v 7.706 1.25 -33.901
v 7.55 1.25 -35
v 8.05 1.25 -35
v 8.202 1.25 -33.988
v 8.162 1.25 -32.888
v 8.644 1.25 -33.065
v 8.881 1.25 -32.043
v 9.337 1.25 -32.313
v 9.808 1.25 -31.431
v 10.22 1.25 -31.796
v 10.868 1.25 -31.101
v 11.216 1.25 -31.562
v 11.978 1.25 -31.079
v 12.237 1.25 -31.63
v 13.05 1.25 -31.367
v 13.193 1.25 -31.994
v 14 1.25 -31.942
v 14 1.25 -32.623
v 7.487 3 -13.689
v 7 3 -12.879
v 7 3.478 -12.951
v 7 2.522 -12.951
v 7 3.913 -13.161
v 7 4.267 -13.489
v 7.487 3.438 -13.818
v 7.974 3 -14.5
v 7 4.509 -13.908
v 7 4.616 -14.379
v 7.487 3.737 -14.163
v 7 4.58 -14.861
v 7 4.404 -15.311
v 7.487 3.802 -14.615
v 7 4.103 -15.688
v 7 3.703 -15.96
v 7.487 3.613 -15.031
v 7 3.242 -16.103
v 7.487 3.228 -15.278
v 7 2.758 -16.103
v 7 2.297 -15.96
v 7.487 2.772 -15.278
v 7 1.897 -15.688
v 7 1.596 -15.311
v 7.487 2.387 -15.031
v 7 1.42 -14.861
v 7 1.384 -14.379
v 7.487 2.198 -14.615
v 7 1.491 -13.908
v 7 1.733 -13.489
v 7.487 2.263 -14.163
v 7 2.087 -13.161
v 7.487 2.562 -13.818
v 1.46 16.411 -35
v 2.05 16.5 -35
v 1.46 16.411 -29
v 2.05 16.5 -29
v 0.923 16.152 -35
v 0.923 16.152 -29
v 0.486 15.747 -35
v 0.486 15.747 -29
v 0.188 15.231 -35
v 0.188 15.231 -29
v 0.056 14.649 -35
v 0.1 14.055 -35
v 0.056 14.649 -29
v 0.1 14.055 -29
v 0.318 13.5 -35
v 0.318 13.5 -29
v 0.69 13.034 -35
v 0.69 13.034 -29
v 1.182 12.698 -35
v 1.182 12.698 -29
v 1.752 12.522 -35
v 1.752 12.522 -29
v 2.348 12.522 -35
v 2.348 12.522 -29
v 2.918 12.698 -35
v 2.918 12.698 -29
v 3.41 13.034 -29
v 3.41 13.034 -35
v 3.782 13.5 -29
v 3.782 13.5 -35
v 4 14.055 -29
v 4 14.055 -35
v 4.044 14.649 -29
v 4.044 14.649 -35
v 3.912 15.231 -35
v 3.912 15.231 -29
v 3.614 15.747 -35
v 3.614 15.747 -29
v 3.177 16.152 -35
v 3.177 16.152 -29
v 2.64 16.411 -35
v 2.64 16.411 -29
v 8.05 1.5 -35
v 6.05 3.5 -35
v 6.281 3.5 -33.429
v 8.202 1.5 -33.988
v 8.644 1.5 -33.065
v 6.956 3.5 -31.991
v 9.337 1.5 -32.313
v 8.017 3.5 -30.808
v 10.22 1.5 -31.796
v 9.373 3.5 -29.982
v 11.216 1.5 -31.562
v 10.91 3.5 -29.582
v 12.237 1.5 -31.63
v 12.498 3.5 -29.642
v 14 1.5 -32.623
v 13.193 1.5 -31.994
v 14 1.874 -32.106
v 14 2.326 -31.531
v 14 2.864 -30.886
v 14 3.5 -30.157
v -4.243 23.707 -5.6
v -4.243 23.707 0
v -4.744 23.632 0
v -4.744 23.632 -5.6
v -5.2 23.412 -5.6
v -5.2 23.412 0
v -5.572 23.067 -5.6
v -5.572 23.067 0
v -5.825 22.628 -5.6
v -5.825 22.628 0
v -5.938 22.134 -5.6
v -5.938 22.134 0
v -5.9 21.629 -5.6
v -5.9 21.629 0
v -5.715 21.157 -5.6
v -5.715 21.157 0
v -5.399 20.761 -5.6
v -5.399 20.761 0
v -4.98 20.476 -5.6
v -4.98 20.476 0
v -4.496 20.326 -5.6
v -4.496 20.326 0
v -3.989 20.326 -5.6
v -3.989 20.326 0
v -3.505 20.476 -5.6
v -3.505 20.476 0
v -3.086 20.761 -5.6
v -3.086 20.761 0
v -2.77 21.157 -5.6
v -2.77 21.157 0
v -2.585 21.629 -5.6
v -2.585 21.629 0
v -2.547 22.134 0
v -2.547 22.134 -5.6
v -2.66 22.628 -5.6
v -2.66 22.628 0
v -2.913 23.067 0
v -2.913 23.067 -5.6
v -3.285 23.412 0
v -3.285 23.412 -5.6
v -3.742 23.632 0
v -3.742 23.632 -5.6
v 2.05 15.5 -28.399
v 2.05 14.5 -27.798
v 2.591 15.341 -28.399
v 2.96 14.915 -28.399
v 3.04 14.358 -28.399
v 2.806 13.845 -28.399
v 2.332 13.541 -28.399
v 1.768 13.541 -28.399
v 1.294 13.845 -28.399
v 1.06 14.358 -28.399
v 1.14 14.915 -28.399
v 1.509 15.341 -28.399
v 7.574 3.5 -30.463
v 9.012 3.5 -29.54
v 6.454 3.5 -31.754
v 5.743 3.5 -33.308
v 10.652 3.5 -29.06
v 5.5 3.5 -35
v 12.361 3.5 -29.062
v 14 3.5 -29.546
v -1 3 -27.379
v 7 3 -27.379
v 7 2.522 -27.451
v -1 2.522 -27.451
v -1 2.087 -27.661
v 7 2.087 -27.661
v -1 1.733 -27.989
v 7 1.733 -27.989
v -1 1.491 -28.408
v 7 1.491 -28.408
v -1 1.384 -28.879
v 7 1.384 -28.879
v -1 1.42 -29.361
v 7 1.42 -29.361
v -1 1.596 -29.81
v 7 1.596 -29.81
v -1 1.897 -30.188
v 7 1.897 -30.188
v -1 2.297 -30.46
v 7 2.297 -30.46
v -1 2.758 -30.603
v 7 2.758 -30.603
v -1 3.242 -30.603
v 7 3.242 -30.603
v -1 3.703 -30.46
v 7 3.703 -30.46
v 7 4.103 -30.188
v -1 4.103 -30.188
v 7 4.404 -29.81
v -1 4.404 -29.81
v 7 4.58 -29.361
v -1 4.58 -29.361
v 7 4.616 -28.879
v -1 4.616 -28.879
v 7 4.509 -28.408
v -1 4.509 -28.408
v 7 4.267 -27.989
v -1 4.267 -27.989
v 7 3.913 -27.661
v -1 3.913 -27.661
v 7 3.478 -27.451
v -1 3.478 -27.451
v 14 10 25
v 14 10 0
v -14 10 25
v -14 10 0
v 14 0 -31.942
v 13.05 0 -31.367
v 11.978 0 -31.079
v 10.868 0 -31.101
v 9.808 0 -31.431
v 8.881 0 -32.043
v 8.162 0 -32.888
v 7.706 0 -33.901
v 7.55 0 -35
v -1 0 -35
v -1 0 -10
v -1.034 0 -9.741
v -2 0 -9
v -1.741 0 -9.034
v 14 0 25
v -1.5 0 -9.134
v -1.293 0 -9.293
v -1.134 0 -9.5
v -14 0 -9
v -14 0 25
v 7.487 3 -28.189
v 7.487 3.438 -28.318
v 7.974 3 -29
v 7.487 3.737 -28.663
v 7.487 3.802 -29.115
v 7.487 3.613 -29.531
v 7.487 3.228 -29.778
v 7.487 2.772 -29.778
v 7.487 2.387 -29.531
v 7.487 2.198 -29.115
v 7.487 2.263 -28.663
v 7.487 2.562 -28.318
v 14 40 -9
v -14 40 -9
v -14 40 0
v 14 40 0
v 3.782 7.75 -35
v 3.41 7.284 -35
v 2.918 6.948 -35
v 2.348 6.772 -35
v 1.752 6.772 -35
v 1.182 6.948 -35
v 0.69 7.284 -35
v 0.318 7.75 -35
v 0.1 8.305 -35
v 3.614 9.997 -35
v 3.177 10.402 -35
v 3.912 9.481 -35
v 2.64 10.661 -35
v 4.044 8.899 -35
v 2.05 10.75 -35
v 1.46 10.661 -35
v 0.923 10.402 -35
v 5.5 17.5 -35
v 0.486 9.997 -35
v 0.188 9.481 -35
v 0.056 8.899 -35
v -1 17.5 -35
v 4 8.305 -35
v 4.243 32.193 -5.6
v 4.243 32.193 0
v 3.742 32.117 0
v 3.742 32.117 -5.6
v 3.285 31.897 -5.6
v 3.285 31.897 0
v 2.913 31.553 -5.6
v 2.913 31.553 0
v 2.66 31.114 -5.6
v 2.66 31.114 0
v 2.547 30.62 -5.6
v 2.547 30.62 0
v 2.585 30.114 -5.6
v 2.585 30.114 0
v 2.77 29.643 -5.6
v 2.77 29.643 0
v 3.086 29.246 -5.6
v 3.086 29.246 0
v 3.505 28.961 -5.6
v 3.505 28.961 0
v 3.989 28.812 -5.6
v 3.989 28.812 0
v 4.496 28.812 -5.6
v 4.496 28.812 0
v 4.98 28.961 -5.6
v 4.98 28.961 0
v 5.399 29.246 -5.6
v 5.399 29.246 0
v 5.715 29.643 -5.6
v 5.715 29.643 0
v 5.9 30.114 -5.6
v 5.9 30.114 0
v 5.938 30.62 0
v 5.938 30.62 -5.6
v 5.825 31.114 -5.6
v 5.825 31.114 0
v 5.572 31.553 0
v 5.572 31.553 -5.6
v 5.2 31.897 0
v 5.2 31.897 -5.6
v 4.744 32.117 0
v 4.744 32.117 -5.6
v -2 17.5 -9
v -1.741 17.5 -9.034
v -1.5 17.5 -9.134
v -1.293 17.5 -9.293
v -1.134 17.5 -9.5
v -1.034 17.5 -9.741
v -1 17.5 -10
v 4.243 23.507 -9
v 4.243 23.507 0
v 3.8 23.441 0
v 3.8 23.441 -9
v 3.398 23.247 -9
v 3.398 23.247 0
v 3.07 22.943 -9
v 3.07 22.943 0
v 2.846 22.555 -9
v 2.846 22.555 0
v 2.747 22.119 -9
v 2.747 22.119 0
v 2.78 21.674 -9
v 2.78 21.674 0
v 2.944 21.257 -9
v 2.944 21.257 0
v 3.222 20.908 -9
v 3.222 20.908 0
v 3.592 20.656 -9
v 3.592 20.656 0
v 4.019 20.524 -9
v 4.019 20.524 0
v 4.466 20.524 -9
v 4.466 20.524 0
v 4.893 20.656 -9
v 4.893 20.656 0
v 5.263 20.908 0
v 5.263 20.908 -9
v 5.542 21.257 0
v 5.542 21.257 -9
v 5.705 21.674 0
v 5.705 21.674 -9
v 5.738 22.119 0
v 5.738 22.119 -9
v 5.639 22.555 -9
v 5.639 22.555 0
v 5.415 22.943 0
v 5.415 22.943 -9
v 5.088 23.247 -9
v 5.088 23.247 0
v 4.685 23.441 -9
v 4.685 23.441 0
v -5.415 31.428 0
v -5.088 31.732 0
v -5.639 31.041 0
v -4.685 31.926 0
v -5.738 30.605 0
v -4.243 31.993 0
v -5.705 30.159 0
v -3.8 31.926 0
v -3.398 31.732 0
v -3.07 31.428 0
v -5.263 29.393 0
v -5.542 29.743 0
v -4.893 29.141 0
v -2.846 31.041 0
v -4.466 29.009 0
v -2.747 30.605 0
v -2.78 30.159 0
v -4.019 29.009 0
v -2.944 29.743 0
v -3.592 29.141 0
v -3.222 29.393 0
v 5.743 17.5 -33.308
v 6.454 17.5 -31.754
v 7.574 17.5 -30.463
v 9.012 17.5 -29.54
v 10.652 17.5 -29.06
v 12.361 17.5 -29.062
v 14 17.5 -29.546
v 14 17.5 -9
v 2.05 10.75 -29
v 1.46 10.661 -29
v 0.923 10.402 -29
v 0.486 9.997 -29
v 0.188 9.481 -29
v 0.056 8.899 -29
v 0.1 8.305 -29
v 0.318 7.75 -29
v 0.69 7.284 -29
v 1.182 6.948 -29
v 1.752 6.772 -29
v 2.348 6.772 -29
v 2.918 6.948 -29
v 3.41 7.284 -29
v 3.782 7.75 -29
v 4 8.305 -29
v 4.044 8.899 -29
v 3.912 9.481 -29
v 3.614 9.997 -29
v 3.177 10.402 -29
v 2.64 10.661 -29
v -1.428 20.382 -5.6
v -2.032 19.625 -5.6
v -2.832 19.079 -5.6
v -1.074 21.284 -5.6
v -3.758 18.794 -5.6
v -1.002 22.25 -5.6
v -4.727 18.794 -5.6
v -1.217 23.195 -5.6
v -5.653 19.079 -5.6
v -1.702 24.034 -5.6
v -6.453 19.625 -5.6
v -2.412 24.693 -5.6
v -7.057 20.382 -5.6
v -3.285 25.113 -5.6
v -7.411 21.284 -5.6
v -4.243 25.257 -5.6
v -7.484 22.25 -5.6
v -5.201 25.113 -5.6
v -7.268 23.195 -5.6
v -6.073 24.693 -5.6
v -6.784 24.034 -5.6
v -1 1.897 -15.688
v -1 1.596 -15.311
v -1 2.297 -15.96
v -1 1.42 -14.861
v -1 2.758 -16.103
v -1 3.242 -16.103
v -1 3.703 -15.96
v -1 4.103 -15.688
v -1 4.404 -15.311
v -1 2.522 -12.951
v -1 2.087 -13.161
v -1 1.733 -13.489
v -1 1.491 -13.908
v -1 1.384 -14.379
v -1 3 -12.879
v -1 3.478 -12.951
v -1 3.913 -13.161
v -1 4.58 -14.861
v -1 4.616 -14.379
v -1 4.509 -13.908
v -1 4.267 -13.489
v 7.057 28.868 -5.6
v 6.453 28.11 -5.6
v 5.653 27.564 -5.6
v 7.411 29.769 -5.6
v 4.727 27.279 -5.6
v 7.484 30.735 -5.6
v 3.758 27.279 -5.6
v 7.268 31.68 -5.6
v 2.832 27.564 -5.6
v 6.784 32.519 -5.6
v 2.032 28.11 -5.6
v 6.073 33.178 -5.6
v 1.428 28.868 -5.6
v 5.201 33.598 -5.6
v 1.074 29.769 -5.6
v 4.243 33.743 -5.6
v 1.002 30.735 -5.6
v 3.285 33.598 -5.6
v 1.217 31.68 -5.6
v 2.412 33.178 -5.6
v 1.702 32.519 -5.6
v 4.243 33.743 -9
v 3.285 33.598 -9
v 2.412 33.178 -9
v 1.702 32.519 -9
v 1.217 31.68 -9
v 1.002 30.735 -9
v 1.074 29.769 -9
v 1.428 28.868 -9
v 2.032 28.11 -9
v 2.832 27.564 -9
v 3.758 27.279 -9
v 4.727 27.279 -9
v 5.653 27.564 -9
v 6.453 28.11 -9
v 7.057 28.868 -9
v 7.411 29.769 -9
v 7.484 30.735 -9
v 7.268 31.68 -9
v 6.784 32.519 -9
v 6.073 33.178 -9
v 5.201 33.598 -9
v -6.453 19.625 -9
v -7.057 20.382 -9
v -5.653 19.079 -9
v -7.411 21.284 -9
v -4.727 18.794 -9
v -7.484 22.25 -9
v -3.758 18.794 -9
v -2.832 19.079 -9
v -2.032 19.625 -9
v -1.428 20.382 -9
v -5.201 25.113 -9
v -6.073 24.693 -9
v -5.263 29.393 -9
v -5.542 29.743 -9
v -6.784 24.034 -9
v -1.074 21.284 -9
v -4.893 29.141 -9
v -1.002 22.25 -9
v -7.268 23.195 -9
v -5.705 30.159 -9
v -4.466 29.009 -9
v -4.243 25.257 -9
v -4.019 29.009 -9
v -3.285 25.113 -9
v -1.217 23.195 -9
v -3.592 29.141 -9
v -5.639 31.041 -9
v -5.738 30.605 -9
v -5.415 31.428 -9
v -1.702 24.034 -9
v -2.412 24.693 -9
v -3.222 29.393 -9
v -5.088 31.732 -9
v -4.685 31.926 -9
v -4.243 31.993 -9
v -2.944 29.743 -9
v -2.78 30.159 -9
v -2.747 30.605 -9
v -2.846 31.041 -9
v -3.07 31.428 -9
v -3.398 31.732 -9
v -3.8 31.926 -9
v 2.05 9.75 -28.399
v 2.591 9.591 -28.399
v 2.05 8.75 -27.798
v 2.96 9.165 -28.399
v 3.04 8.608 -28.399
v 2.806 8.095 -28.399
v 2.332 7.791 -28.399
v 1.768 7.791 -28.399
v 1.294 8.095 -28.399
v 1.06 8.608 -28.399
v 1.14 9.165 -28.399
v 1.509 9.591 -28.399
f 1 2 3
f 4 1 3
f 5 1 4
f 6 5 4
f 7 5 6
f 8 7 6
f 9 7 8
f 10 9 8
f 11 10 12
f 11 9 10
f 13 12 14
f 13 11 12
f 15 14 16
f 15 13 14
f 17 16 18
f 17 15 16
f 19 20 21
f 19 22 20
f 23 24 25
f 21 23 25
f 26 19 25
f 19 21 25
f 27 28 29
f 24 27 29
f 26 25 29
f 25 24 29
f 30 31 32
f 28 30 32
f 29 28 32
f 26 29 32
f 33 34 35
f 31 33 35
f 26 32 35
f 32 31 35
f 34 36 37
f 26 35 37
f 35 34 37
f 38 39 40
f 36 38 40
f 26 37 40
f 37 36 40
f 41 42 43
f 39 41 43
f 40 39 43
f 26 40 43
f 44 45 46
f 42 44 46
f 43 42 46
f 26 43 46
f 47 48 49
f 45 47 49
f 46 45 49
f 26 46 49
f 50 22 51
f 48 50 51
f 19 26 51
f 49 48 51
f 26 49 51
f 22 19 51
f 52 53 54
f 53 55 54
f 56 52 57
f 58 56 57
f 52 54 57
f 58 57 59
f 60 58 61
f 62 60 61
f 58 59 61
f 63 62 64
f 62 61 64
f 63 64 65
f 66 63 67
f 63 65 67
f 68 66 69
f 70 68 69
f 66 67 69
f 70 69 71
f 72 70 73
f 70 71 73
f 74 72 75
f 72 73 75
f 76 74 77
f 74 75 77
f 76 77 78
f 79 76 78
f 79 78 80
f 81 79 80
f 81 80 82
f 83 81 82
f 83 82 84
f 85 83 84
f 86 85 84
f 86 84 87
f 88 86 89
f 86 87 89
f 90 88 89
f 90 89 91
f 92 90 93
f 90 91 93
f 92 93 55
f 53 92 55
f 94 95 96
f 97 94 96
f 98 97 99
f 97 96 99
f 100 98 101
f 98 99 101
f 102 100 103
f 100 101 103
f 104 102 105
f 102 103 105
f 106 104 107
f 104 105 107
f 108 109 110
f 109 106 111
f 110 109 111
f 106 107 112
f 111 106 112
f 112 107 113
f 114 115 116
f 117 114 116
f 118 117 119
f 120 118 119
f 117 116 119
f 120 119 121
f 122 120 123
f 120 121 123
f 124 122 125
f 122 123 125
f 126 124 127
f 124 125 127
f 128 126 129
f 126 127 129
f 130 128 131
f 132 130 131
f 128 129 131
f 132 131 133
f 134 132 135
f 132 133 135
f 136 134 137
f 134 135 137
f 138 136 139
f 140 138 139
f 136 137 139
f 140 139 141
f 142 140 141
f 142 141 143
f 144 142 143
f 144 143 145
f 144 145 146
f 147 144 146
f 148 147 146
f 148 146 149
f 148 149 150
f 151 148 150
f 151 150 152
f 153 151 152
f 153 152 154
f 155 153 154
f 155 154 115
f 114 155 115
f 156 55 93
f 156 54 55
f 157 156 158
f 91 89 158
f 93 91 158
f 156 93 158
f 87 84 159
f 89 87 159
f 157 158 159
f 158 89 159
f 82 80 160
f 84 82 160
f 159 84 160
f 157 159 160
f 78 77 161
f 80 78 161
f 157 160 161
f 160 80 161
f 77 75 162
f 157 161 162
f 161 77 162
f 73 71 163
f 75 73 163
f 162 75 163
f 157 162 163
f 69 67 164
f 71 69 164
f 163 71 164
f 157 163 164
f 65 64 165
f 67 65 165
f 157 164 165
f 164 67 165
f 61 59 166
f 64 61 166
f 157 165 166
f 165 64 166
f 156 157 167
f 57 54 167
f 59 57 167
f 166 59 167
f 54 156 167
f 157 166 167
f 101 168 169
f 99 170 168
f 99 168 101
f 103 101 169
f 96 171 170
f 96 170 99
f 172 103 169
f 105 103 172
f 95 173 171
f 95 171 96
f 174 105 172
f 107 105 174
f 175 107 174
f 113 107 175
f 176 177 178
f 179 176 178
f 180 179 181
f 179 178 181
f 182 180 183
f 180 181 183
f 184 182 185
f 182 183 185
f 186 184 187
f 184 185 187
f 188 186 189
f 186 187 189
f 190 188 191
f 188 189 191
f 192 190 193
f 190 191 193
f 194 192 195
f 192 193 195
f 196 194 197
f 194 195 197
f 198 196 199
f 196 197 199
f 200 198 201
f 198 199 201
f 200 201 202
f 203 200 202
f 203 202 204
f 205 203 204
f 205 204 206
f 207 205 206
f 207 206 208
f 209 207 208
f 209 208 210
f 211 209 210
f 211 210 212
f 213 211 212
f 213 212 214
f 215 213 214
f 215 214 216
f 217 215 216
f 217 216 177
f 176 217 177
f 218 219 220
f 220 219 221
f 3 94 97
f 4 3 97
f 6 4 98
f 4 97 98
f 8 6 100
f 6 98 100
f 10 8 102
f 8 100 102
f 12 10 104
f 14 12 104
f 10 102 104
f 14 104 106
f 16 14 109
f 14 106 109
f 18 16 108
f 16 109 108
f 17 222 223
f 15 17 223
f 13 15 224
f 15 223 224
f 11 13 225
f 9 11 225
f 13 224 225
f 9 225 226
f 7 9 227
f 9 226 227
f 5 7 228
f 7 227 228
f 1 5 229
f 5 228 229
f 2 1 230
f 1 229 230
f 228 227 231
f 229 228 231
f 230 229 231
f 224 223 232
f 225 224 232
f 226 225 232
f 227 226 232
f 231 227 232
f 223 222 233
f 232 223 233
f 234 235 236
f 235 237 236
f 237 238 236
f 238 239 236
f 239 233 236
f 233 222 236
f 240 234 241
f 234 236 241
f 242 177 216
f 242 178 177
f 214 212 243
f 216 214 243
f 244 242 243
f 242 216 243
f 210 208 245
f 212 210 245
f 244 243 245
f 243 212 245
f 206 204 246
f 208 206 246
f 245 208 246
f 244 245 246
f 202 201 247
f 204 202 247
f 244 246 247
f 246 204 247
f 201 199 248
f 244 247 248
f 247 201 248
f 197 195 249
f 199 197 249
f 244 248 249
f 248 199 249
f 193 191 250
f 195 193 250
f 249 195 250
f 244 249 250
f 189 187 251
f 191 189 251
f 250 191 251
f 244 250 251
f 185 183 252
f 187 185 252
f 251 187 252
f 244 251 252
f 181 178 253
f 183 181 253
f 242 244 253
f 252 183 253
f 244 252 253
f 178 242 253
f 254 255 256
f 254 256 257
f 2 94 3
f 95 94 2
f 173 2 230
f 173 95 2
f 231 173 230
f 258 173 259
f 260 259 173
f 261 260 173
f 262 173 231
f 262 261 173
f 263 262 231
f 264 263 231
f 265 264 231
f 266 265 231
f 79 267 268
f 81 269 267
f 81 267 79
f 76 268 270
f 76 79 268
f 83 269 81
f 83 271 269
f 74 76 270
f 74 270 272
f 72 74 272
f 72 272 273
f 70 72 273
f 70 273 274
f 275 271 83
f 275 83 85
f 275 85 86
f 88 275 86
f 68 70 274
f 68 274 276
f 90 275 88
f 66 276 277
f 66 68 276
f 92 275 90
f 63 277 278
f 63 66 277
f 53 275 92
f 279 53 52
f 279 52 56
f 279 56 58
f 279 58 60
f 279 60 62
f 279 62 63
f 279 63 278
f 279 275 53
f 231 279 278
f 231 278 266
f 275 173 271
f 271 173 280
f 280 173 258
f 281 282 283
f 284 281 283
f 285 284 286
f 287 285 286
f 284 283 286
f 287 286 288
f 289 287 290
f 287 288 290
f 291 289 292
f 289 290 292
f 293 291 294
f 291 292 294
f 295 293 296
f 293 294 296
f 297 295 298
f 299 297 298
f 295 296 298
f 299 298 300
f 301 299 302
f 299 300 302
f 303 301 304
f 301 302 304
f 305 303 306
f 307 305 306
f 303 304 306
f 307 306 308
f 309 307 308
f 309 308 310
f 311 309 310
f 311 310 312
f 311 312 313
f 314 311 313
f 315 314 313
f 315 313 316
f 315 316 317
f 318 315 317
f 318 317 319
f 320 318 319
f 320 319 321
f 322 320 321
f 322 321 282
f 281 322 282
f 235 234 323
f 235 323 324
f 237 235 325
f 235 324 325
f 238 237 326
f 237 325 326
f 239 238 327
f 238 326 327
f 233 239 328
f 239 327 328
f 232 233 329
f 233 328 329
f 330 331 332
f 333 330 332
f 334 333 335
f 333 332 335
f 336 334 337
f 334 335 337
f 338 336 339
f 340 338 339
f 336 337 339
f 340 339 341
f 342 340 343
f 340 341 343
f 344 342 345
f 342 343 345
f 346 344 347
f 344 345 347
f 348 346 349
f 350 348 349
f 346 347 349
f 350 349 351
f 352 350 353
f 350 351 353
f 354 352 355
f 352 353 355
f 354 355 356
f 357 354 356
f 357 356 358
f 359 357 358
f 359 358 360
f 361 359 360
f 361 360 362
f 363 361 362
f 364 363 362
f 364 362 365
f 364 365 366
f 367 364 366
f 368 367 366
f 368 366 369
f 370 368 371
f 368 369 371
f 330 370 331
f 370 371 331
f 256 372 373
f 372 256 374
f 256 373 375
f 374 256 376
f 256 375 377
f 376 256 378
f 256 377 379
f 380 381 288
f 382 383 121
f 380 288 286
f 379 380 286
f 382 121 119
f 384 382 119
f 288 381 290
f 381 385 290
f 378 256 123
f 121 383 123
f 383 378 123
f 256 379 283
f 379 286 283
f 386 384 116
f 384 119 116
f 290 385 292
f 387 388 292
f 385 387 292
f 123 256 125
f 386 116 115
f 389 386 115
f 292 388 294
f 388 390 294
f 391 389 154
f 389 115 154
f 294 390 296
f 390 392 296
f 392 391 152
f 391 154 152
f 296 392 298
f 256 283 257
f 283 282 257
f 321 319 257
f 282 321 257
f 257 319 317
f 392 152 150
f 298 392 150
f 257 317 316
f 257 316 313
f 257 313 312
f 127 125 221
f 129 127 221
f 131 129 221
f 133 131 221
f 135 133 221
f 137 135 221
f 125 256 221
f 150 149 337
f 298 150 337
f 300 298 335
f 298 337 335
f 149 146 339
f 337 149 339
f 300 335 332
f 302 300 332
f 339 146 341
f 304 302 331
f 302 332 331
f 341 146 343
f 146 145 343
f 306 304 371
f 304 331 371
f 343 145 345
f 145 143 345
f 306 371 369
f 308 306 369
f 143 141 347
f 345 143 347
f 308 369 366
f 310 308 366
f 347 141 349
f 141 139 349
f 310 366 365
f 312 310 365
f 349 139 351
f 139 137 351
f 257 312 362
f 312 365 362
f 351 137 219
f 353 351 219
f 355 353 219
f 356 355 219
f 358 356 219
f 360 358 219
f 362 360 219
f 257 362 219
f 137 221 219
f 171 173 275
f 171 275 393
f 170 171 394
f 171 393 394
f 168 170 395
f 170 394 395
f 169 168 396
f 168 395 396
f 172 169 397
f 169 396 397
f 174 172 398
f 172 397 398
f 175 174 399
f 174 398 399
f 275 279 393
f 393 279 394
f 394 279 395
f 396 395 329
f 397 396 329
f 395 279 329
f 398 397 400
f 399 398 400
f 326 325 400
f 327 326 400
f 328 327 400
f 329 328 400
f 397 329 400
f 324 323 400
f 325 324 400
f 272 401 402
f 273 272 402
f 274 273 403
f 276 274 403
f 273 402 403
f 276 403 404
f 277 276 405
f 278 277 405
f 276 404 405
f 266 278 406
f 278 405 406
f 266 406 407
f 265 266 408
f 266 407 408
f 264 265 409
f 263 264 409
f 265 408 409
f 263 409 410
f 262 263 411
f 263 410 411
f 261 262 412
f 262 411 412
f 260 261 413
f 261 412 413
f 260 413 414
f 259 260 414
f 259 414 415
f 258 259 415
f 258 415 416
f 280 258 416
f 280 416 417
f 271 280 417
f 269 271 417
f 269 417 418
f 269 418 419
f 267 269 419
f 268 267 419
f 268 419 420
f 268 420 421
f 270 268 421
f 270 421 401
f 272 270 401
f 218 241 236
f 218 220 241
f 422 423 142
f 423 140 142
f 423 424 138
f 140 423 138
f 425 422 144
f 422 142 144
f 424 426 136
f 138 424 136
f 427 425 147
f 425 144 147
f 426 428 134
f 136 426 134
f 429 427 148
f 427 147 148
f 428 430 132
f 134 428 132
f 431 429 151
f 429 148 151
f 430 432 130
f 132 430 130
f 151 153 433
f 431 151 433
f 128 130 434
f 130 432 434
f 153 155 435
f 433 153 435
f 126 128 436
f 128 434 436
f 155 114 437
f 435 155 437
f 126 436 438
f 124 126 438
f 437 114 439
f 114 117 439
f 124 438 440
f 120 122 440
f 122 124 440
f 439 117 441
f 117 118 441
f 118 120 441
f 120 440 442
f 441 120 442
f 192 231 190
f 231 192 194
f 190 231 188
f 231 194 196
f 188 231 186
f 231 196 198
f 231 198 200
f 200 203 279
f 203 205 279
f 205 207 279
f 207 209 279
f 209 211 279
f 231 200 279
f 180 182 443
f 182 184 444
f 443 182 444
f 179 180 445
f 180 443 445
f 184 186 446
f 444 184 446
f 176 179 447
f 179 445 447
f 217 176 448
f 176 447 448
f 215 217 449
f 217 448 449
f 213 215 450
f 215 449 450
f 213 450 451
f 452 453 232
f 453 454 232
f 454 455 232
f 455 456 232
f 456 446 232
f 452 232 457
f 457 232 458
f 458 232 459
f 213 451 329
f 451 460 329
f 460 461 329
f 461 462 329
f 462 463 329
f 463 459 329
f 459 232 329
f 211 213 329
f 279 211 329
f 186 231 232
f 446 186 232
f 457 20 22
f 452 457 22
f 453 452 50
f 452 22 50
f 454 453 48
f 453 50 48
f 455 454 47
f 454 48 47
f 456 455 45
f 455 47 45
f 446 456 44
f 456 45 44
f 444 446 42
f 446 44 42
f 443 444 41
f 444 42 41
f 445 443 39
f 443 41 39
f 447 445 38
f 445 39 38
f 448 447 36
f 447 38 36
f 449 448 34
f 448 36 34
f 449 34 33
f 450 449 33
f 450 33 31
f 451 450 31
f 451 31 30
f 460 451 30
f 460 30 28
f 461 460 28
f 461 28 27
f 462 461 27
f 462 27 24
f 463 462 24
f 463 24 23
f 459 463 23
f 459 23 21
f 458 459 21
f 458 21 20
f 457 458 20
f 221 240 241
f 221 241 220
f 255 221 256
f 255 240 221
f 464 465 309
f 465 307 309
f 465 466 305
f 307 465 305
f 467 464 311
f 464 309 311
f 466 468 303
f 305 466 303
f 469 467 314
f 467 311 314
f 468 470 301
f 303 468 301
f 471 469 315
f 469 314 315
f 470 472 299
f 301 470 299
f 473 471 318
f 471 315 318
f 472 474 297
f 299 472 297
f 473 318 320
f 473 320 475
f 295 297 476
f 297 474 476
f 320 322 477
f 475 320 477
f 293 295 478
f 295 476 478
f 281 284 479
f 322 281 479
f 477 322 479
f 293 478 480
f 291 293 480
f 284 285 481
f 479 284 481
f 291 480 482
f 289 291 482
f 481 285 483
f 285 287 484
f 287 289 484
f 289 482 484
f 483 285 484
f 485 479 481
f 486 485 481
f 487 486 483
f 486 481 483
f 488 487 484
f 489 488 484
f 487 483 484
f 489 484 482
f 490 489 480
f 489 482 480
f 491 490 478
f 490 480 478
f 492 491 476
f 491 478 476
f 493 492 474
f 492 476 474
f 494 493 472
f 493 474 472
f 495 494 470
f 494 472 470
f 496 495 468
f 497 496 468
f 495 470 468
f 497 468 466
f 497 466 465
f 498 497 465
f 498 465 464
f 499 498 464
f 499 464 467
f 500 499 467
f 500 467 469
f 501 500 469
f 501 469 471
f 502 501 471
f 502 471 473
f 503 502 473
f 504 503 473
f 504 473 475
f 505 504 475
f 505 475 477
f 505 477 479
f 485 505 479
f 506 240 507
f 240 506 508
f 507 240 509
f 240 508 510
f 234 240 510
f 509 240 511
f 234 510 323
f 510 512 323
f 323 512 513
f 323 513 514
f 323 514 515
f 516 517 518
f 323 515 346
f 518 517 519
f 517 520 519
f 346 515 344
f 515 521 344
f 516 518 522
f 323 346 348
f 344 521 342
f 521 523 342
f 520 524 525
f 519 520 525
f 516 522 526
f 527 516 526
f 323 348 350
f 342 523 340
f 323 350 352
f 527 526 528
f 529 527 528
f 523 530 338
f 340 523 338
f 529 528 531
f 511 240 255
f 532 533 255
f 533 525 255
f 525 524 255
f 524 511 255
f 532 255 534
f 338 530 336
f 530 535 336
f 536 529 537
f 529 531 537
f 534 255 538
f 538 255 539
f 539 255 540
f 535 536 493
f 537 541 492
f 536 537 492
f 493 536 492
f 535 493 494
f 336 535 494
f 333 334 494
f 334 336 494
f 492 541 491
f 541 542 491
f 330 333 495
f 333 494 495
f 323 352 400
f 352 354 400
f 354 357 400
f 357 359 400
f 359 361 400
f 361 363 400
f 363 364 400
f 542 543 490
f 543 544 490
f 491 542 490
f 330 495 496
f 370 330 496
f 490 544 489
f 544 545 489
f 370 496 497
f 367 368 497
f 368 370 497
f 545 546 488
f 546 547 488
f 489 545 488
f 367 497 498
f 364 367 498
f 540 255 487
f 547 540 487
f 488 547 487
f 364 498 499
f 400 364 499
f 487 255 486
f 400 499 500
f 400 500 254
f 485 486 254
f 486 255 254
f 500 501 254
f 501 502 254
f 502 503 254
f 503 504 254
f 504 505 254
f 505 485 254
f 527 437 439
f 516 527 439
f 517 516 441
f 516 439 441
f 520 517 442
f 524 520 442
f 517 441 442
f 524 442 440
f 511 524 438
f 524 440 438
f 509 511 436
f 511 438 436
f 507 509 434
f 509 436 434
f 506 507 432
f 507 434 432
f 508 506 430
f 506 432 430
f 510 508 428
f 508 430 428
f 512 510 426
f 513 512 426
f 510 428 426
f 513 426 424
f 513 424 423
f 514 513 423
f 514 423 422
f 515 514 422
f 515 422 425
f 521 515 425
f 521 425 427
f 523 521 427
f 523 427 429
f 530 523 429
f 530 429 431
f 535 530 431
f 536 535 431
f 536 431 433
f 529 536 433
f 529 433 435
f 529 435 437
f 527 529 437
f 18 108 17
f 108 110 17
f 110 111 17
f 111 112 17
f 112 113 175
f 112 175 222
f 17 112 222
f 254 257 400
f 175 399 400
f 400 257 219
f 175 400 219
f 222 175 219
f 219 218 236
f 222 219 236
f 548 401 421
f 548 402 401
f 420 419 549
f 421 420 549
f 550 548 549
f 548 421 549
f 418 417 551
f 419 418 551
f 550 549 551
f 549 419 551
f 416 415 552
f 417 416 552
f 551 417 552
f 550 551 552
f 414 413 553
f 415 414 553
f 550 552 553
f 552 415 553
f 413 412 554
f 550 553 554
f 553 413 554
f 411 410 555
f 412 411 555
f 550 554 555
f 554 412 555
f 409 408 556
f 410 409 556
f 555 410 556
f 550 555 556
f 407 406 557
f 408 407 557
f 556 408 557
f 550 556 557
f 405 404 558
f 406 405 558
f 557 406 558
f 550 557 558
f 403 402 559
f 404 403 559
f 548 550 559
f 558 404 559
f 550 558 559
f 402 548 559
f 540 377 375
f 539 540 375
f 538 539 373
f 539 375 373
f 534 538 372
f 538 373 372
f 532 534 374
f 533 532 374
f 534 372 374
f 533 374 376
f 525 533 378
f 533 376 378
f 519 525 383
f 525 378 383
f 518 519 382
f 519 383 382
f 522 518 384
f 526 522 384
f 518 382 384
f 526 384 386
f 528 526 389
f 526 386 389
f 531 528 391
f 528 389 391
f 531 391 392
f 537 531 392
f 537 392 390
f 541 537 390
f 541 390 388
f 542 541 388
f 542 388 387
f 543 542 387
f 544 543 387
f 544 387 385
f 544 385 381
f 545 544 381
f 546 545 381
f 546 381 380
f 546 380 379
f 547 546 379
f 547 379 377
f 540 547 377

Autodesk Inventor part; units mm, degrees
ref_plane "YZ Plane" through (0, 0, 0) normal (1, 0, 0) x (0, 1, 0)
ref_plane "XZ Plane" through (0, 0, 0) normal (0, 1, 0) x (-1, 0, 0)
ref_plane "XY Plane" through (0, 0, 0) normal (0, 0, 1) x (1, 0, 0)
sketch "Skizze2" plane through (0, 0, 0) normal (0, 1, 0) x (-1, 0, 0)
  line L0 (14, 0) -> (-14, 0)
  line L1 (-14, 0) -> (-14, -5)
  line L2 (-14, -5) -> (1, -5)
  line L3 (1, -5) -> (1, -9)
  line L4 (1, -9) -> (14, -9)
  line L5 (14, -9) -> (14, 0)
  line L6 (0, -10.8) -> (0, 1.8) projected
  line L7 (19.6, 0) -> (-19.6, 0) projected
  point P0 (0, 0)
  dimension "d4" = 28
  dimension "d5" = 9
  dimension "d6" = 5
  dimension "d8" = 13
  dimension "d9" = 15
extrude "Extrusion2" add sketch "Skizze2" along normal blind 40
sketch "Skizze4" plane through (0, 40, 0) normal (0, 1, 0) x (1, 0, 0)
  line L0 (14, 5) -> (-1, 5)
  line L1 (-1, 5) -> (-1, 9)
  line L2 (-1, 9) -> (14, 9)
  line L3 (14, 9) -> (14, 5)
  line L4 (14, 5) -> (-1, 9) construction
  line L5 (-1, 5) -> (14, 9) construction
  line L6 (14, 5) -> (-1, 5) projected
  line L7 (-1, 5) -> (-1, 9) projected
  point P0 (0, 0)
  point P1 (6.5, 7)
extrude "Extrusion3" add sketch "Skizze4" against normal blind 22.5
sketch "Skizze6" plane through (14, 40, -9) normal (0, 0, -1) x (-1, 0, 0)
  line L0 (14, -48) -> (14, 8) projected
  line L1 (0, 0) -> (28, 0) projected
  point P0 (14, -40)
  point P1 (9.7574, -9.5074)
  point P2 (18.2426, -9.5074)
  point P3 (18.2426, -17.9926)
  point P4 (9.7574, -17.9926)
  dimension "d44" = 8.4853
  dimension "d45" = 8.4853
  dimension "d46" = 9.5074
  dimension "d47" = 17.9926
hole "Bohrung3" at (4.2426, 22.0074, -9) at (-4.2426, 30.4926, -9) direction (0, 0, 1) diameter 3 end through all
hole "Bohrung4" at (4.2426, 30.4926, -9) at (-4.2426, 22.0074, -9) direction (0, 0, 1) diameter 3.4 end through all counterbore diameter 6.5 counterbore depth 3.4 clearance for "Sechskantkopfschraube DIN EN 24017" size "M3" standard "DIN"
sketch "Skizze8" plane through (-14, 0, 0) normal (0, 0, 1) x (1, 0, 0)
  line L0 (0, 0) -> (0, 40) projected
  line L1 (28, 0) -> (28, 17.5) projected
  line L2 (0, 0) -> (28, 0)
  line L3 (28, 0) -> (28, 10)
  line L4 (28, 10) -> (0, 10)
  line L5 (0, 10) -> (0, 0)
  point P0 (14, 0)
  point P1 (0, 10)
  dimension "d85" = 10
extrude "Extrusion4" add sketch "Skizze8" along normal blind 25
sketch "Skizze9" plane through (14, 0, -5) normal (0, 0, -1) x (-1, 0, 0)
  line L0 (0, 0) -> (15, 0) projected
  line L1 (15, 0) -> (15, 17.5) projected
  line L2 (0, 0) -> (15, 0)
  line L3 (15, 0) -> (15, 17.5)
  line L4 (15, 17.5) -> (0, 17.5)
  line L5 (0, 17.5) -> (0, 0)
  point P0 (14, 0)
extrude "Extrusion5" add sketch "Skizze9" along normal blind 30
sketch "Skizze13" plane through (14, 0, -35) normal (0, 0, -1) x (-1, 0, 0)
  line L0 (0, 3.5) -> (0, 17.5) projected
  line L1 (15, 17.5) -> (0, 17.5) projected
  point P0 (14, 0)
  point P1 (11.95, 14.5)
  point P2 (11.95, 8.75)
  point P3 (6, 17.5)
  dimension "d102" = 11.95
  dimension "d103" = 3
  dimension "d104" = 8.75
hole "Bohrung7" at (2.05, 14.5, -35) at (2.05, 8.75, -35) direction (0, 0, 1) diameter 4 depth 6 tip angle 118
sketch "Skizze14" plane through (-1, 0, -9) normal (-1, 0, 0) x (0, 0, 1)
  line L0 (0, 0) -> (-26, 0) projected
  line L1 (-26, 0) -> (-26, 17.5) projected
  point P0 (9, 0)
  point P1 (-20, 3)
  point P2 (-5.5, 3)
  dimension "d112" = 3
  dimension "d113" = 6
  dimension "d114" = 14.5
hole "Bohrung8" at (-1, 3, -29) at (-1, 3, -14.5) direction (1, 0, 0) diameter 3.242 depth 8 tip angle 118 thread size "M4x0.7" class "6H" standard "ISO Metric profile"
fillet "Rundung2" radius 1 1 edges at (-1, 8.75, -9)
sketch "Skizze15" plane through (-1, 17.5, -35) normal (0, 1, 0) x (1, 0, 0)
  circle A0 centre (12.5, 0) radius 3.45
  line L0 (15, -26) -> (15, 0) projected
  line L1 (0, 0) -> (15, 0) projected
  point P0 (1, -35)
  dimension "d123" = 6.9
  dimension "d124" = 2.5
extrude "Extrusion9" cut sketch "Skizze15" against normal through all
sketch "Skizze16" plane through (-2, 17.5, -9) normal (0, 1, 0) x (1, 0, 0)
  circle A0 centre (13.5, 26) radius 6
  arc A1 (10.05, 26) -> (16, 23.6225) centre (13.5, 26) ccw projected
  point P0 (2, -9)
  dimension "d127" = 12
extrude "Extrusion10" cut sketch "Skizze16" against normal blind 14
chamfer "Fasen3" distance 2 angle 45 1 edges at (10.2199, 3.5, -31.7963)
sketch "Skizze18" plane through (0, 0, 0) normal (0, -1, 0) x (1, 0, 0)
  circle A0 centre (11.5, -35) radius 3.95
  arc A1 (14, -32.6225) -> (8.05, -35) centre (11.5, -35) ccw projected
  point P0 (0, 0)
  dimension "d134" = 7.9
extrude "Extrusion11" cut sketch "Skizze18" against normal blind 1.25
properties part number "JH_int_Adapterplatte"
